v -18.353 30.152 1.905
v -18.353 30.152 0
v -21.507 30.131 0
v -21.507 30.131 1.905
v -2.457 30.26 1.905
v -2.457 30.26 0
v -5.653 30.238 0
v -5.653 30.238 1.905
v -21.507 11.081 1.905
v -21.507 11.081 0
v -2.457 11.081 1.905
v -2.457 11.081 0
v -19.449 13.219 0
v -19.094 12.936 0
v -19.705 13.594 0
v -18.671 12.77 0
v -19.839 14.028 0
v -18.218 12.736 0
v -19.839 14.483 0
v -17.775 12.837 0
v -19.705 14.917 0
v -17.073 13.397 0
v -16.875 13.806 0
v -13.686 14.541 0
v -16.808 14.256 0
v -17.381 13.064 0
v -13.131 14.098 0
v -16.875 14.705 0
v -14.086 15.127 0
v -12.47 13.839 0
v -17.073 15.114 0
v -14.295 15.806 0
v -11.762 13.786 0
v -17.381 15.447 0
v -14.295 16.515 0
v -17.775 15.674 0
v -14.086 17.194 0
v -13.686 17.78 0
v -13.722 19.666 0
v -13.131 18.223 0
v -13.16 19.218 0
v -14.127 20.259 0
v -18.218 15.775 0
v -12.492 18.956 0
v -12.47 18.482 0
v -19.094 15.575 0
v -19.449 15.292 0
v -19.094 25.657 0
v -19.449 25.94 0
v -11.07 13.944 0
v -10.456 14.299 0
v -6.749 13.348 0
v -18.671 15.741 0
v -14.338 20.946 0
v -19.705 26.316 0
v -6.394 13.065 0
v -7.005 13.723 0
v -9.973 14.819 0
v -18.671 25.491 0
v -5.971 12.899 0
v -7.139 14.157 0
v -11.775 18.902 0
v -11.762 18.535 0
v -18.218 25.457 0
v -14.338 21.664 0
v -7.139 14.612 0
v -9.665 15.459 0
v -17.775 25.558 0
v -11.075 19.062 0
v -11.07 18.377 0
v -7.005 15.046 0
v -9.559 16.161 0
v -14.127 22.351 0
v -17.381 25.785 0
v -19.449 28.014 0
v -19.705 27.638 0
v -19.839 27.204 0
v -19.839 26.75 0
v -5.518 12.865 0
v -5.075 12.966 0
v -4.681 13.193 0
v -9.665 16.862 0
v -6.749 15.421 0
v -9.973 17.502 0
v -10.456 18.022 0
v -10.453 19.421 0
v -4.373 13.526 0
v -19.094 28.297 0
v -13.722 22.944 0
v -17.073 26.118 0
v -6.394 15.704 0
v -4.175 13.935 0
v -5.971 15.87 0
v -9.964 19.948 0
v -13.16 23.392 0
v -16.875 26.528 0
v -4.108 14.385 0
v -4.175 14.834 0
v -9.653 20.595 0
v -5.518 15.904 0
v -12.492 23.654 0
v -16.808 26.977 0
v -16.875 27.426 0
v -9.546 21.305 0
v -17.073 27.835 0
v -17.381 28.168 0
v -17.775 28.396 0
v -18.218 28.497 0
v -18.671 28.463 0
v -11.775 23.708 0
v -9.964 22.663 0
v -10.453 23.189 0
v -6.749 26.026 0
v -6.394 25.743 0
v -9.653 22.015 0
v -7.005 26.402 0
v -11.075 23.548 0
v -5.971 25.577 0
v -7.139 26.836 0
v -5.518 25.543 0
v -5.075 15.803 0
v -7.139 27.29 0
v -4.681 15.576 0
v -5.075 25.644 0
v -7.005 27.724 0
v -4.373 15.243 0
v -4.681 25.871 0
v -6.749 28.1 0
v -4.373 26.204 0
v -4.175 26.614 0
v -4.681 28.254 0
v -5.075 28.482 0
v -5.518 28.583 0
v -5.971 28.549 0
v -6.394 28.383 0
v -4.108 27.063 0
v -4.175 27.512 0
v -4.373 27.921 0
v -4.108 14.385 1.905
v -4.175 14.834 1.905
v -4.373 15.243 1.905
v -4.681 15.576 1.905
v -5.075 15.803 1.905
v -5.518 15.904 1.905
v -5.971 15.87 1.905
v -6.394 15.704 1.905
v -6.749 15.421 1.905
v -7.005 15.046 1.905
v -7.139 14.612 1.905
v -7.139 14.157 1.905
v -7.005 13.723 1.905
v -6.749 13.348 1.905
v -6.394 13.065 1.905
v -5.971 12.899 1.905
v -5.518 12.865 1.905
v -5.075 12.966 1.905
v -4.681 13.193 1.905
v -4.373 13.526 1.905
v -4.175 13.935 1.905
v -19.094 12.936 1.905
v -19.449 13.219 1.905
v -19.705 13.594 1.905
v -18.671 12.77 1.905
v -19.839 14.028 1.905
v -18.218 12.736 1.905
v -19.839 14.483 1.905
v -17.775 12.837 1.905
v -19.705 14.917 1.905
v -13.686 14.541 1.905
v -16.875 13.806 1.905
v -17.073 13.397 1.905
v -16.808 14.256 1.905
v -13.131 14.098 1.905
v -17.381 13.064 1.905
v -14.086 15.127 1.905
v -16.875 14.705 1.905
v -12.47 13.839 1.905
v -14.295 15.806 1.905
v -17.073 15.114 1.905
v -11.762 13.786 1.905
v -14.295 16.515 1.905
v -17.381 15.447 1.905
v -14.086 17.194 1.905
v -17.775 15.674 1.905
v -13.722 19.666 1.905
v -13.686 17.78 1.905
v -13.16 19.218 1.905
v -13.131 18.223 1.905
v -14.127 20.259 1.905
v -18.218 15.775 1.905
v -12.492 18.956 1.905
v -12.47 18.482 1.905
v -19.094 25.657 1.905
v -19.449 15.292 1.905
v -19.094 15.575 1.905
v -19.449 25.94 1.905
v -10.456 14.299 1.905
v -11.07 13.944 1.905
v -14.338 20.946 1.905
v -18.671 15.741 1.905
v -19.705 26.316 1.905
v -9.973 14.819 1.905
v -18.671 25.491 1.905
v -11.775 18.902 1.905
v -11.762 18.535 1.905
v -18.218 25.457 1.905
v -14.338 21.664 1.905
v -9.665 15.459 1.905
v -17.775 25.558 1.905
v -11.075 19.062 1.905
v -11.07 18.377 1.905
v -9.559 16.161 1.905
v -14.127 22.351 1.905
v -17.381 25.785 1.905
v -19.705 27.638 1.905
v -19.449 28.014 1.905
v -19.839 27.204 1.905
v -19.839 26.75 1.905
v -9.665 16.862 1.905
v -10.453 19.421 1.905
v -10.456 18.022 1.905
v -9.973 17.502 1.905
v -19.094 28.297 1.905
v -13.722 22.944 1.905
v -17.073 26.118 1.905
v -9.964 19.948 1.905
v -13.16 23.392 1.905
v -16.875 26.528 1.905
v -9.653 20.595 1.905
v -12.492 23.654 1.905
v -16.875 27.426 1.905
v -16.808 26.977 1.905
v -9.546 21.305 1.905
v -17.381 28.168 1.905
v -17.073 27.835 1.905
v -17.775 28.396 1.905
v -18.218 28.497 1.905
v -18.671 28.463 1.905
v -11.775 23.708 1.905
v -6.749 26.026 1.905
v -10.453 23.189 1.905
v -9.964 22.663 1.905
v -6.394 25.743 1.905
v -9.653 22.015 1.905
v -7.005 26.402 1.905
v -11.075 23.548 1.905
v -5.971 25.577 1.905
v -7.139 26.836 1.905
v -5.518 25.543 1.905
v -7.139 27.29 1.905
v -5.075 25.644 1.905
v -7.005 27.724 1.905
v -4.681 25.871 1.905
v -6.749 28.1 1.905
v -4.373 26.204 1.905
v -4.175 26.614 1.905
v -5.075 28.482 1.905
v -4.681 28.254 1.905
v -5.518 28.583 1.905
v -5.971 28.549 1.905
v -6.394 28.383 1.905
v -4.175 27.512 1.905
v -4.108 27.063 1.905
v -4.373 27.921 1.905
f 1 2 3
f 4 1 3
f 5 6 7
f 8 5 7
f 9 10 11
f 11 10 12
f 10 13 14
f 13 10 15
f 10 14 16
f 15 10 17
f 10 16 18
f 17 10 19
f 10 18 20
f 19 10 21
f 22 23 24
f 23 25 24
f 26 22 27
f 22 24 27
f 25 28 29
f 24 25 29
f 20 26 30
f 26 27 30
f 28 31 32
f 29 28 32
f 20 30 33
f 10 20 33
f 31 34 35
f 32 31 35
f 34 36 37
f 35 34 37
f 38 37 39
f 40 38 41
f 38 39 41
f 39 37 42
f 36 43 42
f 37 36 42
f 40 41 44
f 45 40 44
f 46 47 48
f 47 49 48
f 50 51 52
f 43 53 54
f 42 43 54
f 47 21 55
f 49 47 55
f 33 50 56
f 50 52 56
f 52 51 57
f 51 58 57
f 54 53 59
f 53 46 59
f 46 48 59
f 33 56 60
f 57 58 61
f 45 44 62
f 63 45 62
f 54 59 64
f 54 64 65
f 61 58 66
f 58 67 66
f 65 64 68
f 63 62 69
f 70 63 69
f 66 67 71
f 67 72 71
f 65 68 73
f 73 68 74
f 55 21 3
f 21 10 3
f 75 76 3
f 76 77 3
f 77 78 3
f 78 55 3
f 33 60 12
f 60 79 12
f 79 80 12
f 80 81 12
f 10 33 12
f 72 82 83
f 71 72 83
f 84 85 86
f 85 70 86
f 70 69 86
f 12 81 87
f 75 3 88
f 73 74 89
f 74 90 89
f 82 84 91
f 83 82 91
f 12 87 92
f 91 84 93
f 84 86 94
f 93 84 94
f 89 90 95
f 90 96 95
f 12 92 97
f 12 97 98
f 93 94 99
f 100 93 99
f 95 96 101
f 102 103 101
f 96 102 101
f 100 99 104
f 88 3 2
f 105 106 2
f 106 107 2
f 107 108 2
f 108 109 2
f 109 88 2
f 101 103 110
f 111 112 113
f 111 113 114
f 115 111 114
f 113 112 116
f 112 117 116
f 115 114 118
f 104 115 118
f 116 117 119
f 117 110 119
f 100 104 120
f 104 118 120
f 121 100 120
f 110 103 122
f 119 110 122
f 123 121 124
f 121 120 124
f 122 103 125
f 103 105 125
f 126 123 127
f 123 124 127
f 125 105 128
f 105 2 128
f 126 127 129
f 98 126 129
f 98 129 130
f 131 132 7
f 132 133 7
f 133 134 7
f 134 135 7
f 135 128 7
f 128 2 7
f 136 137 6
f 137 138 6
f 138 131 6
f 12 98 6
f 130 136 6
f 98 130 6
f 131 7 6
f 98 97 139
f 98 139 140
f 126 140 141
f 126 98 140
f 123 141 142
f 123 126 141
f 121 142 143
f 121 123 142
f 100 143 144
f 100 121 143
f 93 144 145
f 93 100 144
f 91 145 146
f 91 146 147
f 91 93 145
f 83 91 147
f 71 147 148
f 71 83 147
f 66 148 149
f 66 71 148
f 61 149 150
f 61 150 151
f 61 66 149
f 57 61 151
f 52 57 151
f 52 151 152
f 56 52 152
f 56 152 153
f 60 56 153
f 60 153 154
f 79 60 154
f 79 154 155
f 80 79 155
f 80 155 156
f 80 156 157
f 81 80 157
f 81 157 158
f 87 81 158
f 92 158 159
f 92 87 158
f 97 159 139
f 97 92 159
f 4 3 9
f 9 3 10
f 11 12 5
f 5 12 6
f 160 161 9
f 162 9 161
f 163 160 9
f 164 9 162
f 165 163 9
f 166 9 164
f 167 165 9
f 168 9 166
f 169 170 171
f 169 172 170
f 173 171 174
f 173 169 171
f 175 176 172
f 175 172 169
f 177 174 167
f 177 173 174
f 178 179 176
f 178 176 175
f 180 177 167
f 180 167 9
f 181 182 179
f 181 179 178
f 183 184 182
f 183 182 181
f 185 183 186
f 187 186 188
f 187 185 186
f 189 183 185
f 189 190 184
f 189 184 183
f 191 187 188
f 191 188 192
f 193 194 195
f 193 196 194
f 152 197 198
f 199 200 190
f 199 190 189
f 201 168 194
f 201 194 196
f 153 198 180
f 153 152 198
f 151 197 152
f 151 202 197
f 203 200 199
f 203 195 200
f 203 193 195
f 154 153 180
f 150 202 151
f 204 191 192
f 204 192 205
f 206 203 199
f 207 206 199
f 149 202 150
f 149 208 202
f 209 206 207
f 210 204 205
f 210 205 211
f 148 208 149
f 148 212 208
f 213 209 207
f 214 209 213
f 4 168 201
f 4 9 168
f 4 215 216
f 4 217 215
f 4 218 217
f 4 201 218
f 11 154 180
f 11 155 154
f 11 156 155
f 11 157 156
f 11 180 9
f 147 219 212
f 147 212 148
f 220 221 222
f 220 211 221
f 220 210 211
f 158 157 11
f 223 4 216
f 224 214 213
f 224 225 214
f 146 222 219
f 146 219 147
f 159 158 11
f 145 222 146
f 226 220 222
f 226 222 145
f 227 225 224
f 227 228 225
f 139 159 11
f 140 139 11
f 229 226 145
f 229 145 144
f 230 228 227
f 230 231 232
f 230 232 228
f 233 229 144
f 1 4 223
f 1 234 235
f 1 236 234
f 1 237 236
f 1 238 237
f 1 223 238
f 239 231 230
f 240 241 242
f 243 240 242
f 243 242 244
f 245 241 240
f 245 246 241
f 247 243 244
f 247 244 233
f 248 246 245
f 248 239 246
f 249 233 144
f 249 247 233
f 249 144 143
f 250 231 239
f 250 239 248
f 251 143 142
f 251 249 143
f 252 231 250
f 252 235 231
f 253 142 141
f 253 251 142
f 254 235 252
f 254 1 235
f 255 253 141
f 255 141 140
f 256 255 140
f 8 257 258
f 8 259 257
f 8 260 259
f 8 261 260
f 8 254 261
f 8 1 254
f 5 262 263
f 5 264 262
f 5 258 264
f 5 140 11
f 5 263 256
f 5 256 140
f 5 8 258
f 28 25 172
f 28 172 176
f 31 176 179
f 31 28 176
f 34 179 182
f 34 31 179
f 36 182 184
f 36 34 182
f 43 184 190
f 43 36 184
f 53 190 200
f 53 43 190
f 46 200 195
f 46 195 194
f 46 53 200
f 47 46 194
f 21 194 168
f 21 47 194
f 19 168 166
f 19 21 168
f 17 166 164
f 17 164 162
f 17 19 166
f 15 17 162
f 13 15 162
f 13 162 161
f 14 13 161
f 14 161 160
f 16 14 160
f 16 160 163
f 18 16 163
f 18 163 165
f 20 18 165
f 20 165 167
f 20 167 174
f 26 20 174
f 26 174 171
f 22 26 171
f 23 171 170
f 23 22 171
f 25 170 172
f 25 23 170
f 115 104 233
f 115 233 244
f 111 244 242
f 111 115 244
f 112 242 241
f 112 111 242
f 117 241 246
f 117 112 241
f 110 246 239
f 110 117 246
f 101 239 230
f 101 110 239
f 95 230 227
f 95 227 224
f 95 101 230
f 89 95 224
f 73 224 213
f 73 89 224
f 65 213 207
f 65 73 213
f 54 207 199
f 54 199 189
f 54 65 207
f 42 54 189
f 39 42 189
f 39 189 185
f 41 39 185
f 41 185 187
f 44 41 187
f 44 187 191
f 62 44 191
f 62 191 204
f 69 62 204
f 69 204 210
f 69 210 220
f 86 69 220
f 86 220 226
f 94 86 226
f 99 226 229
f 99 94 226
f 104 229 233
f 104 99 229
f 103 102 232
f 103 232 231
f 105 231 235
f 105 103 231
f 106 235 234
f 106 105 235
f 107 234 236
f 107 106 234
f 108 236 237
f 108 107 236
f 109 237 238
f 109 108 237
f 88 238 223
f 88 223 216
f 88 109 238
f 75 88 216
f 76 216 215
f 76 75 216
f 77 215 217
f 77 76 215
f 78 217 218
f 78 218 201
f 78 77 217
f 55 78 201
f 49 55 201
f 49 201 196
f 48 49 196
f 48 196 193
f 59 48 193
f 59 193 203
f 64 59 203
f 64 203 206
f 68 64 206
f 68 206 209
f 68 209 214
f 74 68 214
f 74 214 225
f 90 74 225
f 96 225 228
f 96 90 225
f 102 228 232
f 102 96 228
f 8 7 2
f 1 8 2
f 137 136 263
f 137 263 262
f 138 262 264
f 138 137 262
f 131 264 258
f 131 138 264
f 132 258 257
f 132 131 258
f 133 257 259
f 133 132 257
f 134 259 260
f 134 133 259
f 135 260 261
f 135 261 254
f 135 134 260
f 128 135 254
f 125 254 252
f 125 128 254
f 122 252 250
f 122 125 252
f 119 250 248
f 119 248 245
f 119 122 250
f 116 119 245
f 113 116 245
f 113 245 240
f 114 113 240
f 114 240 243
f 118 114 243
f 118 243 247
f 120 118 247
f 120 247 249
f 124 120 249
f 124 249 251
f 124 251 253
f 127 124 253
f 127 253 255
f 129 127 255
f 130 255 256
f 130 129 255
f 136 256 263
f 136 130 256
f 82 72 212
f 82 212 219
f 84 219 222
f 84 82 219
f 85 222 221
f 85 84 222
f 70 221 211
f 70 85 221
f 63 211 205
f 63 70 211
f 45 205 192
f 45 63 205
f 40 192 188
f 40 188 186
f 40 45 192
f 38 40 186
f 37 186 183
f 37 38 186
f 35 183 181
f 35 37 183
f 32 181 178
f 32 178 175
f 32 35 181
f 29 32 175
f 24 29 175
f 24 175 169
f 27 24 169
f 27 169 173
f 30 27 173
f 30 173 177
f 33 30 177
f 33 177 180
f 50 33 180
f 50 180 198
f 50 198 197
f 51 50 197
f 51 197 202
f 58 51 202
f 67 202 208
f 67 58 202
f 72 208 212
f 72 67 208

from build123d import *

# Parameters (mm, degrees)
F0_R     = 1.524
F0_R_2   = 2.38125
F0_R_3   = 2.409757
F1_DEPTH = 1.905


with BuildPart() as f1:
    # F0 (on Top) → F1 (new body)
    with BuildSketch(Plane.XY):
        Polygon((-21.506696, 26.976964), (-21.506696, 15.779537), (-21.506696, 14.255537), (-21.506696, 11.080537), (-18.331696, 11.080537), (-5.631696, 11.080537), (-2.456696, 11.080537), (-2.456696, 14.255537), (-2.456696, 14.384539), (-2.456696, 15.908539), (-2.456696, 27.062965), (-2.456696, 30.259539), (-5.653195, 30.237893), (-18.353195, 30.151892), (-21.506696, 30.130537), align=None)
        with Locations((-18.331696, 14.255537)):
            Circle(F0_R, mode=Mode.SUBTRACT)
        with Locations((-5.631696, 14.384539)):
            Circle(F0_R, mode=Mode.SUBTRACT)
        with Locations((-11.940342, 16.160537)):
            Circle(F0_R_2, mode=Mode.SUBTRACT)
        with Locations((-18.331696, 26.976964)):
            Circle(F0_R, mode=Mode.SUBTRACT)
        with Locations((-11.955501, 21.305038)):
            Circle(F0_R_3, mode=Mode.SUBTRACT)
        with Locations((-5.631696, 27.062965)):
            Circle(F0_R, mode=Mode.SUBTRACT)
    extrude(amount=F1_DEPTH)


solid = f1.part
